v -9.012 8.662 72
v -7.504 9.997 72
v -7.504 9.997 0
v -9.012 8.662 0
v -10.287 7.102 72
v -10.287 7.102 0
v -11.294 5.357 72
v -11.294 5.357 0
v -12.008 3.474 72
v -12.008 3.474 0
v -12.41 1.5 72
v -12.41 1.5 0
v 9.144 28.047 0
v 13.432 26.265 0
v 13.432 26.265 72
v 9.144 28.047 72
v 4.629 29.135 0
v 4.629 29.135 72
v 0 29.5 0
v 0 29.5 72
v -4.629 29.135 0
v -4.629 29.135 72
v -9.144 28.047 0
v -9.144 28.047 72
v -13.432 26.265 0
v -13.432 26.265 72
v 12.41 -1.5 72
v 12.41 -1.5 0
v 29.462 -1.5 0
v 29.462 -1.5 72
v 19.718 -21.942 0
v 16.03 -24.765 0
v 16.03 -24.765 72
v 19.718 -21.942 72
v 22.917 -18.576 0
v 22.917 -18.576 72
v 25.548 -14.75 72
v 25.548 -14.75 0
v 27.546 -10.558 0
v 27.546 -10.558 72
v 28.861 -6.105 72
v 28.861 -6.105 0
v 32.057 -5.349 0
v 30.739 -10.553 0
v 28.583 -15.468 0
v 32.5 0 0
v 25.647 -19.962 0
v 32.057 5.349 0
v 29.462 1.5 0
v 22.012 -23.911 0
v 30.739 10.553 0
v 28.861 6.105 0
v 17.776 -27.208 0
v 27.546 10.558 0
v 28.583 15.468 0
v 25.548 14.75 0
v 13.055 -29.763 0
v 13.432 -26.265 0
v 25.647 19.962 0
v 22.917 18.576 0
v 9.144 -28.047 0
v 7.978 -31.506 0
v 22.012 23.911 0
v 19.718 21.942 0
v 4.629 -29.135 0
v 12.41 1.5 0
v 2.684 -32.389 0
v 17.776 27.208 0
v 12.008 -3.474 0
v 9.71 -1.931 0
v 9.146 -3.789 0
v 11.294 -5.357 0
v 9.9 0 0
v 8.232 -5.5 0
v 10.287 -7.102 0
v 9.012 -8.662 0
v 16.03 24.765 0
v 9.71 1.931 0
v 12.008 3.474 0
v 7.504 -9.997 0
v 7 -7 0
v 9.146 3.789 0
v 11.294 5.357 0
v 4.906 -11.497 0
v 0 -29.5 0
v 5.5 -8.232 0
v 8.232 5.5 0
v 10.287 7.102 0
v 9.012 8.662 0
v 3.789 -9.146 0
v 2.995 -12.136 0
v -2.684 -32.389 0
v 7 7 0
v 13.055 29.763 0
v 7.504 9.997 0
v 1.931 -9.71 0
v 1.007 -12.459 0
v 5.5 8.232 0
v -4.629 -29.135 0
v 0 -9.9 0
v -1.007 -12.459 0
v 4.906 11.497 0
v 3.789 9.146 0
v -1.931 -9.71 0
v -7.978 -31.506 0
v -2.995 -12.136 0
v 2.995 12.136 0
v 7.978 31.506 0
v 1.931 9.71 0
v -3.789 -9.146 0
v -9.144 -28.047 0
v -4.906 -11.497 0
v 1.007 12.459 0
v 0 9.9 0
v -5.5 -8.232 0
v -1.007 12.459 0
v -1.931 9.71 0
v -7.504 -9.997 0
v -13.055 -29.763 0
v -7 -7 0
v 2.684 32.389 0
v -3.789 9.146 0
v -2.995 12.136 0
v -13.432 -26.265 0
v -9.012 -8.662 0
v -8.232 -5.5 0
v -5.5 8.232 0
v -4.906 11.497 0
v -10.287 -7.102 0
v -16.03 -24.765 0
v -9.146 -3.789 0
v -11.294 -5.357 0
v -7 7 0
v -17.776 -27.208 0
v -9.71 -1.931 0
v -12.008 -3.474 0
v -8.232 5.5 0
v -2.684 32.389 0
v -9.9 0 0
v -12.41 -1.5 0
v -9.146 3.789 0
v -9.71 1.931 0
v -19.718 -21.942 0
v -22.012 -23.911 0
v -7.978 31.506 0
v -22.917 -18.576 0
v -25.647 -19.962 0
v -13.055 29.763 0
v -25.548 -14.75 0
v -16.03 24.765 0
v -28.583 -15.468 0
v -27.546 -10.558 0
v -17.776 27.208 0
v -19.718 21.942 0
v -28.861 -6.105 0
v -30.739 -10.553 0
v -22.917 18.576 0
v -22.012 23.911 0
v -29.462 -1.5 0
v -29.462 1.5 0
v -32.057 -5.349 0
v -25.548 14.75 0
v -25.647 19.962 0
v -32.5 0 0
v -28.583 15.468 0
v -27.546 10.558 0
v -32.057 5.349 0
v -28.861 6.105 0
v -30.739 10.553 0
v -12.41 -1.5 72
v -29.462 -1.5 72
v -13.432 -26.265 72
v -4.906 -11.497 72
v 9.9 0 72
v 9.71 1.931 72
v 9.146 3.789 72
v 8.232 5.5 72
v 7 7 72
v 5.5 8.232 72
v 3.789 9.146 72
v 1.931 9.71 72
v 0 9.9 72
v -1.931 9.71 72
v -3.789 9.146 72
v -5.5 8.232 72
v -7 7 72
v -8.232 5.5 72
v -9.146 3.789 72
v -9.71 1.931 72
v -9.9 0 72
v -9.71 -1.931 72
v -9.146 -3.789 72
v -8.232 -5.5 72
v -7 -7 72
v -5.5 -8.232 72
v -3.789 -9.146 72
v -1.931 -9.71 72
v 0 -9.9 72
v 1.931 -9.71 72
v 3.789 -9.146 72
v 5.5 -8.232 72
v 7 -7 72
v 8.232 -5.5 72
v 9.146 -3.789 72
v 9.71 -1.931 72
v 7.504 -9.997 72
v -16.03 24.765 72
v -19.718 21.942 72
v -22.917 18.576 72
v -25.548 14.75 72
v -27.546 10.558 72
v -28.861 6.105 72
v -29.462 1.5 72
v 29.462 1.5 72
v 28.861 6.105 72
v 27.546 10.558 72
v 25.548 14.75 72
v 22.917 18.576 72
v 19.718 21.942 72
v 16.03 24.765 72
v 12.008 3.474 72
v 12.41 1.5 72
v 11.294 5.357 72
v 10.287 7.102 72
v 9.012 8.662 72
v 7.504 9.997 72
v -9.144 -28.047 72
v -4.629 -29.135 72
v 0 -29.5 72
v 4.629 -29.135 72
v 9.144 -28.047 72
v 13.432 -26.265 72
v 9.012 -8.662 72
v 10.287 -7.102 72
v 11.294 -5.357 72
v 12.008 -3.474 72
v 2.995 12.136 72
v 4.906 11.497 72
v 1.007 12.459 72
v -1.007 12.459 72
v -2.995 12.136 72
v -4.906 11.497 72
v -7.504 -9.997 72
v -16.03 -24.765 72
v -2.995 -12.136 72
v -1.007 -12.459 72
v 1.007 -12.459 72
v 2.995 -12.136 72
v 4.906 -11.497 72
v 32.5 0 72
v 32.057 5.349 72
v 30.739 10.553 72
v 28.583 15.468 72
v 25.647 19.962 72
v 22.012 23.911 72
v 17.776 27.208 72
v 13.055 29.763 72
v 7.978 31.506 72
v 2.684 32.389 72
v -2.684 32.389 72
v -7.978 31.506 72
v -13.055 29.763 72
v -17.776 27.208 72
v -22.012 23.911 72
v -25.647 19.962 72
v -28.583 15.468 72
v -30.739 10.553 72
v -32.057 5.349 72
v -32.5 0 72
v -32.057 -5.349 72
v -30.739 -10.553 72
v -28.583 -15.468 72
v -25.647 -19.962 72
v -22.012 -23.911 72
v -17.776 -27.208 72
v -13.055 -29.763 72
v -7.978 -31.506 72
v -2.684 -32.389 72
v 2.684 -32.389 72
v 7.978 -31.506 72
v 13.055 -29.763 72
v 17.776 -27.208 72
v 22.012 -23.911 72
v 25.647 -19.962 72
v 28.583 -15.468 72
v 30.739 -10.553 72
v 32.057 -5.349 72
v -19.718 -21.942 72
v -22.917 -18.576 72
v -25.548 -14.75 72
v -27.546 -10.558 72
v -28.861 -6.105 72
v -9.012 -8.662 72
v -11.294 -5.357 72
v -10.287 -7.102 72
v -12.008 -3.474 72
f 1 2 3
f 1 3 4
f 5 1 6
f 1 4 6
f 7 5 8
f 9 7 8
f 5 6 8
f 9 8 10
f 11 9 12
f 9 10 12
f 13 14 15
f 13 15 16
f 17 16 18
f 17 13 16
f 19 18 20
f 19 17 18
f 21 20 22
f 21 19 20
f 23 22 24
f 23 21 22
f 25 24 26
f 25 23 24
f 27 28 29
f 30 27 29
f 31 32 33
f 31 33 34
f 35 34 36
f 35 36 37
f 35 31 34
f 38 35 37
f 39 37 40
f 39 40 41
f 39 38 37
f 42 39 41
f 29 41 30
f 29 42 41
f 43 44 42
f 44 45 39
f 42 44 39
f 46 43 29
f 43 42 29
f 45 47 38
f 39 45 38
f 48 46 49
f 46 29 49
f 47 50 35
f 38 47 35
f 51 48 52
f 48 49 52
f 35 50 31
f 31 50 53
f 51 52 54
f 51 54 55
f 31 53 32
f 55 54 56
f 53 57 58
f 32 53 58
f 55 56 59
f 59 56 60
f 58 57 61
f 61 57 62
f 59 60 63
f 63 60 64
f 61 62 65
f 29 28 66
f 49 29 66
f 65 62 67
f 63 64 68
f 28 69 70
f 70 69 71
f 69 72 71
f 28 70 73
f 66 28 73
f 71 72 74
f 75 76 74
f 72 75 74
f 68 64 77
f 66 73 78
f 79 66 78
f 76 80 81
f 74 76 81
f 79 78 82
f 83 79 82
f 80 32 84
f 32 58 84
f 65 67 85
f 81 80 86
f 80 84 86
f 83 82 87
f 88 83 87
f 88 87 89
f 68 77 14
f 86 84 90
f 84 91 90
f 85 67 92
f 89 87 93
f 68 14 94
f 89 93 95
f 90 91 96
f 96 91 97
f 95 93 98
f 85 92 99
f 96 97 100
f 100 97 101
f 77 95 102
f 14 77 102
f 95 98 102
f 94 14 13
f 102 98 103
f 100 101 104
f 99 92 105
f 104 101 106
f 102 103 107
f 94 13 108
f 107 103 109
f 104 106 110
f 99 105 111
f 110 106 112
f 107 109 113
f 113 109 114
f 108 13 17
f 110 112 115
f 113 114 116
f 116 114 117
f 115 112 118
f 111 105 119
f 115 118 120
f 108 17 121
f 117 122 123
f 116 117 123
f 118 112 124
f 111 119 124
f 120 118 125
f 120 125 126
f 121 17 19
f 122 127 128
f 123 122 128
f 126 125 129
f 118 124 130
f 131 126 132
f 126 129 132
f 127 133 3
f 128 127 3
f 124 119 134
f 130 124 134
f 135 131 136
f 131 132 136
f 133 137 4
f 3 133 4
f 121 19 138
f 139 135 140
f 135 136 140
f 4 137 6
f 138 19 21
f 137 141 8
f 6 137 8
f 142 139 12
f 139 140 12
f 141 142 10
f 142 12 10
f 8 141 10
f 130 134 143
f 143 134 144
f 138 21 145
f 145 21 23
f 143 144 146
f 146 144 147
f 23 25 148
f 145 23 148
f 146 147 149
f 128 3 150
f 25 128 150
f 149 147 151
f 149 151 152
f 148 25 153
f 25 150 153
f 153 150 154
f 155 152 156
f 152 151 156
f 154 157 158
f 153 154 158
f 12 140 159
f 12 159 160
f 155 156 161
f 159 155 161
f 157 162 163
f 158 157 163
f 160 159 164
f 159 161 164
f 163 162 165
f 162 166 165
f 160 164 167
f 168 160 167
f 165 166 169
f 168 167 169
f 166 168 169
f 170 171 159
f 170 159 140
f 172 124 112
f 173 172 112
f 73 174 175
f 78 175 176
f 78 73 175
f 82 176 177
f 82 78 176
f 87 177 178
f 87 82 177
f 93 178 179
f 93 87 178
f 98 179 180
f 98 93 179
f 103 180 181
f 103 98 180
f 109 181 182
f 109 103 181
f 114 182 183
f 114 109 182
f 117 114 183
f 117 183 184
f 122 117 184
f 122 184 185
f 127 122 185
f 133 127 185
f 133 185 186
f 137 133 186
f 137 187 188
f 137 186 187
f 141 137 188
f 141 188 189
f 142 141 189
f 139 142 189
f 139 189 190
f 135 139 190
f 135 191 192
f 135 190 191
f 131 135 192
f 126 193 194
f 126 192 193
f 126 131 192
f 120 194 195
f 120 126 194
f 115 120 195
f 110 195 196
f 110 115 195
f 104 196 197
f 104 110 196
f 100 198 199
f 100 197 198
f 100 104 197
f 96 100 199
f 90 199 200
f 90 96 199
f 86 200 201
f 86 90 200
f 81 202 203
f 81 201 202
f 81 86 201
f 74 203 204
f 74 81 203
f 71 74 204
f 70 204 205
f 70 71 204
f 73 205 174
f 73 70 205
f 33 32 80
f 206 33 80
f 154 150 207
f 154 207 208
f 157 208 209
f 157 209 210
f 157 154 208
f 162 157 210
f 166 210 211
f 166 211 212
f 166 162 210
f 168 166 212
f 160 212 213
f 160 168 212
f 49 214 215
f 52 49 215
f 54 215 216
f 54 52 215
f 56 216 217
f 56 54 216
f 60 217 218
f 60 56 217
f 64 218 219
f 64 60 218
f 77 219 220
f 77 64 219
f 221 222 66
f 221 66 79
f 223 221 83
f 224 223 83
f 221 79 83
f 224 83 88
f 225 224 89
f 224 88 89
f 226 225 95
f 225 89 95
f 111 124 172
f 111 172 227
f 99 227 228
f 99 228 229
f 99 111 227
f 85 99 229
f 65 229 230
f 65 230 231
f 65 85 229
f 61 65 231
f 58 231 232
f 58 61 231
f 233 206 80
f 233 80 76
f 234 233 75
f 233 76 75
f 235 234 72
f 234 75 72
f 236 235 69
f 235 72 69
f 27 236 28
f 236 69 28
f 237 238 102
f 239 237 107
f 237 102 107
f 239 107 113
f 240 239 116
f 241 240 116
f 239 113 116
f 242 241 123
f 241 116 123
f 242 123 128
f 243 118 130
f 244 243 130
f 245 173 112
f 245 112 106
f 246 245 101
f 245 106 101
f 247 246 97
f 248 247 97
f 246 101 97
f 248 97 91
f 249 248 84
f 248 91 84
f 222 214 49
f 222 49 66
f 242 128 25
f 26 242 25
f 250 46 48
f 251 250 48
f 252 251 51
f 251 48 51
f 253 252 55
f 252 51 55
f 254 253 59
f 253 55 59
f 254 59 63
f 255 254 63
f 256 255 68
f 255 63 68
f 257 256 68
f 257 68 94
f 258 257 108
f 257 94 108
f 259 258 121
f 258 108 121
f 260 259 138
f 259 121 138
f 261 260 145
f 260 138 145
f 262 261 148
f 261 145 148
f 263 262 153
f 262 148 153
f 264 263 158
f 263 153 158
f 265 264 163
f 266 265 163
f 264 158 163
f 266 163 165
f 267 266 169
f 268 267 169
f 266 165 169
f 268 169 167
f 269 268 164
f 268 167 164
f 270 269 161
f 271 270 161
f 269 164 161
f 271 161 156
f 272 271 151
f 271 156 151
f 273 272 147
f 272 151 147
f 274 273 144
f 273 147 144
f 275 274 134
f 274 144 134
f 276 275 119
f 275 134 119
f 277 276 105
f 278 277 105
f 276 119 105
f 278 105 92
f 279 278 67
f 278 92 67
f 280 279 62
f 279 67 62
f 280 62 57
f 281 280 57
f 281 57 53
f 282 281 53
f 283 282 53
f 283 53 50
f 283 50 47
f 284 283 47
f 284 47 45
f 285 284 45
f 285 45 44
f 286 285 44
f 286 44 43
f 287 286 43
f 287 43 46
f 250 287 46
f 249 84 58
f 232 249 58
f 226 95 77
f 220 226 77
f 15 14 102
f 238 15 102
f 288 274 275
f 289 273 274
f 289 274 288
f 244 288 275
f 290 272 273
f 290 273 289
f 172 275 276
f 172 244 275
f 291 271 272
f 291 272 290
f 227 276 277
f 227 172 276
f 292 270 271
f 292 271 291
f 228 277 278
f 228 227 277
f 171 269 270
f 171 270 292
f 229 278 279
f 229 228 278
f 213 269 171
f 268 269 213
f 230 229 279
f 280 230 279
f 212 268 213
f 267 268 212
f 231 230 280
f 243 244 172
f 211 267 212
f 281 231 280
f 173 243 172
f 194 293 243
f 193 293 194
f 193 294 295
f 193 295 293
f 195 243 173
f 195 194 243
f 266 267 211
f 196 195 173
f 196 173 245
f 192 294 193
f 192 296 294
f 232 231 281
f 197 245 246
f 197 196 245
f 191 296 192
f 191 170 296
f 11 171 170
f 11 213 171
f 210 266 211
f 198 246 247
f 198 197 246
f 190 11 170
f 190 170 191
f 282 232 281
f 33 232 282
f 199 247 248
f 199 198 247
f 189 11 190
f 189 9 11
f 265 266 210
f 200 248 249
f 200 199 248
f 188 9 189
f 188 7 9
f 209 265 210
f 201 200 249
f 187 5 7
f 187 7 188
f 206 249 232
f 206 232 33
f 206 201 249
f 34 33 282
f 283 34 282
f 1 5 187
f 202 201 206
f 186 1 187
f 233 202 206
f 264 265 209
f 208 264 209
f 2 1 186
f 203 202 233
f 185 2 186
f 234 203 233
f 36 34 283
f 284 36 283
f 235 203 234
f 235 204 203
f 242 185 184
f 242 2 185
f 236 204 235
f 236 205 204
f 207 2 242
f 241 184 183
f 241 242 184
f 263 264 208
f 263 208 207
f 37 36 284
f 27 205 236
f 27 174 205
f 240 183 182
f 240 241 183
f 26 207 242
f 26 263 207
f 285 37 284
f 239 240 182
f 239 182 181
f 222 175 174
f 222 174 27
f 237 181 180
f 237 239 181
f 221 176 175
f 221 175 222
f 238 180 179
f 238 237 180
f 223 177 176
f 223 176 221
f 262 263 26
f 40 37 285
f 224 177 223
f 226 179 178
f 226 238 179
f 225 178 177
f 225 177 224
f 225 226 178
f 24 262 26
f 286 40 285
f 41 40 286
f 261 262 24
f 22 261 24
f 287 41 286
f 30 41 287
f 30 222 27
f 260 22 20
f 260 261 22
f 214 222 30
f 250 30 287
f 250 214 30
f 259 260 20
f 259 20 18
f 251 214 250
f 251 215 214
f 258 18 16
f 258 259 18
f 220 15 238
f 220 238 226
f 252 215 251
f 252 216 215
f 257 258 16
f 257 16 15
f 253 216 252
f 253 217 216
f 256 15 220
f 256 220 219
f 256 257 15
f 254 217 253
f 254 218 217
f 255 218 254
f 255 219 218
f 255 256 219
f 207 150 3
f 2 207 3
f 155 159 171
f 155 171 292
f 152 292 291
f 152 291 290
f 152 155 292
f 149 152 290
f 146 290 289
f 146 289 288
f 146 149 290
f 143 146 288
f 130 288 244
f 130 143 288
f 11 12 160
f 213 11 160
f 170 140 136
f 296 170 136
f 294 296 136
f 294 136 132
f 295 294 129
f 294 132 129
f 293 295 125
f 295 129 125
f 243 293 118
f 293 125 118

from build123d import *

# Parameters (mm, degrees)
SKETCH1_R           = 32.5
SKETCH1_R_2         = 29.5
BOSS_EXTRUDE1_DEPTH = 72
BOSS_EXTRUDE2_DEPTH = 72
CIRPATTERN1_COUNT   = 3
CIRPATTERN1_ANGLE   = 120
SKETCH7_R           = 12.5
BOSS_EXTRUDE5_DEPTH = 72
SKETCH9_R           = 9.9
CUT_EXTRUDE4_DEPTH  = 86.419552797


with BuildPart() as part:
    # Sketch1 → Boss-Extrude1 (new body)
    with BuildSketch(Plane.XY):
        Circle(SKETCH1_R)
        Circle(SKETCH1_R_2, mode=Mode.SUBTRACT)
    extrude(amount=BOSS_EXTRUDE1_DEPTH)

    # Sketch2 → Boss-Extrude2 (add, through all)
    with BuildSketch(Plane.XY):
        with BuildLine():
            Line((-29.461839725, -1.5), (29.461839725, -1.5))
            ThreePointArc((29.461839725, -1.5), (29.5, 0), (29.461839725, 1.5))
            Line((29.461839725, 1.5), (-29.461839725, 1.5))
            ThreePointArc((-29.461839725, 1.5), (-29.5, 0), (-29.461839725, -1.5))
        make_face()
    boss_extrude2 = extrude(amount=BOSS_EXTRUDE2_DEPTH)

    # CirPattern1: Boss-Extrude2 ×3 about axis
    cirpattern1_axis = Axis((0, 0, 0), (0, 0, 1))
    for i in range(1, CIRPATTERN1_COUNT):
        add(boss_extrude2.rotate(cirpattern1_axis, i * CIRPATTERN1_ANGLE / (CIRPATTERN1_COUNT - 1)))

    # Sketch7 → Boss-Extrude5 (add, through all)
    with BuildSketch(Plane.XY):
        Circle(SKETCH7_R)
    extrude(amount=BOSS_EXTRUDE5_DEPTH)

    # Sketch9 → Cut-Extrude4 (cut, through all)
    with BuildSketch(Plane.XY):
        Circle(SKETCH9_R)
    extrude(amount=CUT_EXTRUDE4_DEPTH, mode=Mode.SUBTRACT)


solid = part.part
